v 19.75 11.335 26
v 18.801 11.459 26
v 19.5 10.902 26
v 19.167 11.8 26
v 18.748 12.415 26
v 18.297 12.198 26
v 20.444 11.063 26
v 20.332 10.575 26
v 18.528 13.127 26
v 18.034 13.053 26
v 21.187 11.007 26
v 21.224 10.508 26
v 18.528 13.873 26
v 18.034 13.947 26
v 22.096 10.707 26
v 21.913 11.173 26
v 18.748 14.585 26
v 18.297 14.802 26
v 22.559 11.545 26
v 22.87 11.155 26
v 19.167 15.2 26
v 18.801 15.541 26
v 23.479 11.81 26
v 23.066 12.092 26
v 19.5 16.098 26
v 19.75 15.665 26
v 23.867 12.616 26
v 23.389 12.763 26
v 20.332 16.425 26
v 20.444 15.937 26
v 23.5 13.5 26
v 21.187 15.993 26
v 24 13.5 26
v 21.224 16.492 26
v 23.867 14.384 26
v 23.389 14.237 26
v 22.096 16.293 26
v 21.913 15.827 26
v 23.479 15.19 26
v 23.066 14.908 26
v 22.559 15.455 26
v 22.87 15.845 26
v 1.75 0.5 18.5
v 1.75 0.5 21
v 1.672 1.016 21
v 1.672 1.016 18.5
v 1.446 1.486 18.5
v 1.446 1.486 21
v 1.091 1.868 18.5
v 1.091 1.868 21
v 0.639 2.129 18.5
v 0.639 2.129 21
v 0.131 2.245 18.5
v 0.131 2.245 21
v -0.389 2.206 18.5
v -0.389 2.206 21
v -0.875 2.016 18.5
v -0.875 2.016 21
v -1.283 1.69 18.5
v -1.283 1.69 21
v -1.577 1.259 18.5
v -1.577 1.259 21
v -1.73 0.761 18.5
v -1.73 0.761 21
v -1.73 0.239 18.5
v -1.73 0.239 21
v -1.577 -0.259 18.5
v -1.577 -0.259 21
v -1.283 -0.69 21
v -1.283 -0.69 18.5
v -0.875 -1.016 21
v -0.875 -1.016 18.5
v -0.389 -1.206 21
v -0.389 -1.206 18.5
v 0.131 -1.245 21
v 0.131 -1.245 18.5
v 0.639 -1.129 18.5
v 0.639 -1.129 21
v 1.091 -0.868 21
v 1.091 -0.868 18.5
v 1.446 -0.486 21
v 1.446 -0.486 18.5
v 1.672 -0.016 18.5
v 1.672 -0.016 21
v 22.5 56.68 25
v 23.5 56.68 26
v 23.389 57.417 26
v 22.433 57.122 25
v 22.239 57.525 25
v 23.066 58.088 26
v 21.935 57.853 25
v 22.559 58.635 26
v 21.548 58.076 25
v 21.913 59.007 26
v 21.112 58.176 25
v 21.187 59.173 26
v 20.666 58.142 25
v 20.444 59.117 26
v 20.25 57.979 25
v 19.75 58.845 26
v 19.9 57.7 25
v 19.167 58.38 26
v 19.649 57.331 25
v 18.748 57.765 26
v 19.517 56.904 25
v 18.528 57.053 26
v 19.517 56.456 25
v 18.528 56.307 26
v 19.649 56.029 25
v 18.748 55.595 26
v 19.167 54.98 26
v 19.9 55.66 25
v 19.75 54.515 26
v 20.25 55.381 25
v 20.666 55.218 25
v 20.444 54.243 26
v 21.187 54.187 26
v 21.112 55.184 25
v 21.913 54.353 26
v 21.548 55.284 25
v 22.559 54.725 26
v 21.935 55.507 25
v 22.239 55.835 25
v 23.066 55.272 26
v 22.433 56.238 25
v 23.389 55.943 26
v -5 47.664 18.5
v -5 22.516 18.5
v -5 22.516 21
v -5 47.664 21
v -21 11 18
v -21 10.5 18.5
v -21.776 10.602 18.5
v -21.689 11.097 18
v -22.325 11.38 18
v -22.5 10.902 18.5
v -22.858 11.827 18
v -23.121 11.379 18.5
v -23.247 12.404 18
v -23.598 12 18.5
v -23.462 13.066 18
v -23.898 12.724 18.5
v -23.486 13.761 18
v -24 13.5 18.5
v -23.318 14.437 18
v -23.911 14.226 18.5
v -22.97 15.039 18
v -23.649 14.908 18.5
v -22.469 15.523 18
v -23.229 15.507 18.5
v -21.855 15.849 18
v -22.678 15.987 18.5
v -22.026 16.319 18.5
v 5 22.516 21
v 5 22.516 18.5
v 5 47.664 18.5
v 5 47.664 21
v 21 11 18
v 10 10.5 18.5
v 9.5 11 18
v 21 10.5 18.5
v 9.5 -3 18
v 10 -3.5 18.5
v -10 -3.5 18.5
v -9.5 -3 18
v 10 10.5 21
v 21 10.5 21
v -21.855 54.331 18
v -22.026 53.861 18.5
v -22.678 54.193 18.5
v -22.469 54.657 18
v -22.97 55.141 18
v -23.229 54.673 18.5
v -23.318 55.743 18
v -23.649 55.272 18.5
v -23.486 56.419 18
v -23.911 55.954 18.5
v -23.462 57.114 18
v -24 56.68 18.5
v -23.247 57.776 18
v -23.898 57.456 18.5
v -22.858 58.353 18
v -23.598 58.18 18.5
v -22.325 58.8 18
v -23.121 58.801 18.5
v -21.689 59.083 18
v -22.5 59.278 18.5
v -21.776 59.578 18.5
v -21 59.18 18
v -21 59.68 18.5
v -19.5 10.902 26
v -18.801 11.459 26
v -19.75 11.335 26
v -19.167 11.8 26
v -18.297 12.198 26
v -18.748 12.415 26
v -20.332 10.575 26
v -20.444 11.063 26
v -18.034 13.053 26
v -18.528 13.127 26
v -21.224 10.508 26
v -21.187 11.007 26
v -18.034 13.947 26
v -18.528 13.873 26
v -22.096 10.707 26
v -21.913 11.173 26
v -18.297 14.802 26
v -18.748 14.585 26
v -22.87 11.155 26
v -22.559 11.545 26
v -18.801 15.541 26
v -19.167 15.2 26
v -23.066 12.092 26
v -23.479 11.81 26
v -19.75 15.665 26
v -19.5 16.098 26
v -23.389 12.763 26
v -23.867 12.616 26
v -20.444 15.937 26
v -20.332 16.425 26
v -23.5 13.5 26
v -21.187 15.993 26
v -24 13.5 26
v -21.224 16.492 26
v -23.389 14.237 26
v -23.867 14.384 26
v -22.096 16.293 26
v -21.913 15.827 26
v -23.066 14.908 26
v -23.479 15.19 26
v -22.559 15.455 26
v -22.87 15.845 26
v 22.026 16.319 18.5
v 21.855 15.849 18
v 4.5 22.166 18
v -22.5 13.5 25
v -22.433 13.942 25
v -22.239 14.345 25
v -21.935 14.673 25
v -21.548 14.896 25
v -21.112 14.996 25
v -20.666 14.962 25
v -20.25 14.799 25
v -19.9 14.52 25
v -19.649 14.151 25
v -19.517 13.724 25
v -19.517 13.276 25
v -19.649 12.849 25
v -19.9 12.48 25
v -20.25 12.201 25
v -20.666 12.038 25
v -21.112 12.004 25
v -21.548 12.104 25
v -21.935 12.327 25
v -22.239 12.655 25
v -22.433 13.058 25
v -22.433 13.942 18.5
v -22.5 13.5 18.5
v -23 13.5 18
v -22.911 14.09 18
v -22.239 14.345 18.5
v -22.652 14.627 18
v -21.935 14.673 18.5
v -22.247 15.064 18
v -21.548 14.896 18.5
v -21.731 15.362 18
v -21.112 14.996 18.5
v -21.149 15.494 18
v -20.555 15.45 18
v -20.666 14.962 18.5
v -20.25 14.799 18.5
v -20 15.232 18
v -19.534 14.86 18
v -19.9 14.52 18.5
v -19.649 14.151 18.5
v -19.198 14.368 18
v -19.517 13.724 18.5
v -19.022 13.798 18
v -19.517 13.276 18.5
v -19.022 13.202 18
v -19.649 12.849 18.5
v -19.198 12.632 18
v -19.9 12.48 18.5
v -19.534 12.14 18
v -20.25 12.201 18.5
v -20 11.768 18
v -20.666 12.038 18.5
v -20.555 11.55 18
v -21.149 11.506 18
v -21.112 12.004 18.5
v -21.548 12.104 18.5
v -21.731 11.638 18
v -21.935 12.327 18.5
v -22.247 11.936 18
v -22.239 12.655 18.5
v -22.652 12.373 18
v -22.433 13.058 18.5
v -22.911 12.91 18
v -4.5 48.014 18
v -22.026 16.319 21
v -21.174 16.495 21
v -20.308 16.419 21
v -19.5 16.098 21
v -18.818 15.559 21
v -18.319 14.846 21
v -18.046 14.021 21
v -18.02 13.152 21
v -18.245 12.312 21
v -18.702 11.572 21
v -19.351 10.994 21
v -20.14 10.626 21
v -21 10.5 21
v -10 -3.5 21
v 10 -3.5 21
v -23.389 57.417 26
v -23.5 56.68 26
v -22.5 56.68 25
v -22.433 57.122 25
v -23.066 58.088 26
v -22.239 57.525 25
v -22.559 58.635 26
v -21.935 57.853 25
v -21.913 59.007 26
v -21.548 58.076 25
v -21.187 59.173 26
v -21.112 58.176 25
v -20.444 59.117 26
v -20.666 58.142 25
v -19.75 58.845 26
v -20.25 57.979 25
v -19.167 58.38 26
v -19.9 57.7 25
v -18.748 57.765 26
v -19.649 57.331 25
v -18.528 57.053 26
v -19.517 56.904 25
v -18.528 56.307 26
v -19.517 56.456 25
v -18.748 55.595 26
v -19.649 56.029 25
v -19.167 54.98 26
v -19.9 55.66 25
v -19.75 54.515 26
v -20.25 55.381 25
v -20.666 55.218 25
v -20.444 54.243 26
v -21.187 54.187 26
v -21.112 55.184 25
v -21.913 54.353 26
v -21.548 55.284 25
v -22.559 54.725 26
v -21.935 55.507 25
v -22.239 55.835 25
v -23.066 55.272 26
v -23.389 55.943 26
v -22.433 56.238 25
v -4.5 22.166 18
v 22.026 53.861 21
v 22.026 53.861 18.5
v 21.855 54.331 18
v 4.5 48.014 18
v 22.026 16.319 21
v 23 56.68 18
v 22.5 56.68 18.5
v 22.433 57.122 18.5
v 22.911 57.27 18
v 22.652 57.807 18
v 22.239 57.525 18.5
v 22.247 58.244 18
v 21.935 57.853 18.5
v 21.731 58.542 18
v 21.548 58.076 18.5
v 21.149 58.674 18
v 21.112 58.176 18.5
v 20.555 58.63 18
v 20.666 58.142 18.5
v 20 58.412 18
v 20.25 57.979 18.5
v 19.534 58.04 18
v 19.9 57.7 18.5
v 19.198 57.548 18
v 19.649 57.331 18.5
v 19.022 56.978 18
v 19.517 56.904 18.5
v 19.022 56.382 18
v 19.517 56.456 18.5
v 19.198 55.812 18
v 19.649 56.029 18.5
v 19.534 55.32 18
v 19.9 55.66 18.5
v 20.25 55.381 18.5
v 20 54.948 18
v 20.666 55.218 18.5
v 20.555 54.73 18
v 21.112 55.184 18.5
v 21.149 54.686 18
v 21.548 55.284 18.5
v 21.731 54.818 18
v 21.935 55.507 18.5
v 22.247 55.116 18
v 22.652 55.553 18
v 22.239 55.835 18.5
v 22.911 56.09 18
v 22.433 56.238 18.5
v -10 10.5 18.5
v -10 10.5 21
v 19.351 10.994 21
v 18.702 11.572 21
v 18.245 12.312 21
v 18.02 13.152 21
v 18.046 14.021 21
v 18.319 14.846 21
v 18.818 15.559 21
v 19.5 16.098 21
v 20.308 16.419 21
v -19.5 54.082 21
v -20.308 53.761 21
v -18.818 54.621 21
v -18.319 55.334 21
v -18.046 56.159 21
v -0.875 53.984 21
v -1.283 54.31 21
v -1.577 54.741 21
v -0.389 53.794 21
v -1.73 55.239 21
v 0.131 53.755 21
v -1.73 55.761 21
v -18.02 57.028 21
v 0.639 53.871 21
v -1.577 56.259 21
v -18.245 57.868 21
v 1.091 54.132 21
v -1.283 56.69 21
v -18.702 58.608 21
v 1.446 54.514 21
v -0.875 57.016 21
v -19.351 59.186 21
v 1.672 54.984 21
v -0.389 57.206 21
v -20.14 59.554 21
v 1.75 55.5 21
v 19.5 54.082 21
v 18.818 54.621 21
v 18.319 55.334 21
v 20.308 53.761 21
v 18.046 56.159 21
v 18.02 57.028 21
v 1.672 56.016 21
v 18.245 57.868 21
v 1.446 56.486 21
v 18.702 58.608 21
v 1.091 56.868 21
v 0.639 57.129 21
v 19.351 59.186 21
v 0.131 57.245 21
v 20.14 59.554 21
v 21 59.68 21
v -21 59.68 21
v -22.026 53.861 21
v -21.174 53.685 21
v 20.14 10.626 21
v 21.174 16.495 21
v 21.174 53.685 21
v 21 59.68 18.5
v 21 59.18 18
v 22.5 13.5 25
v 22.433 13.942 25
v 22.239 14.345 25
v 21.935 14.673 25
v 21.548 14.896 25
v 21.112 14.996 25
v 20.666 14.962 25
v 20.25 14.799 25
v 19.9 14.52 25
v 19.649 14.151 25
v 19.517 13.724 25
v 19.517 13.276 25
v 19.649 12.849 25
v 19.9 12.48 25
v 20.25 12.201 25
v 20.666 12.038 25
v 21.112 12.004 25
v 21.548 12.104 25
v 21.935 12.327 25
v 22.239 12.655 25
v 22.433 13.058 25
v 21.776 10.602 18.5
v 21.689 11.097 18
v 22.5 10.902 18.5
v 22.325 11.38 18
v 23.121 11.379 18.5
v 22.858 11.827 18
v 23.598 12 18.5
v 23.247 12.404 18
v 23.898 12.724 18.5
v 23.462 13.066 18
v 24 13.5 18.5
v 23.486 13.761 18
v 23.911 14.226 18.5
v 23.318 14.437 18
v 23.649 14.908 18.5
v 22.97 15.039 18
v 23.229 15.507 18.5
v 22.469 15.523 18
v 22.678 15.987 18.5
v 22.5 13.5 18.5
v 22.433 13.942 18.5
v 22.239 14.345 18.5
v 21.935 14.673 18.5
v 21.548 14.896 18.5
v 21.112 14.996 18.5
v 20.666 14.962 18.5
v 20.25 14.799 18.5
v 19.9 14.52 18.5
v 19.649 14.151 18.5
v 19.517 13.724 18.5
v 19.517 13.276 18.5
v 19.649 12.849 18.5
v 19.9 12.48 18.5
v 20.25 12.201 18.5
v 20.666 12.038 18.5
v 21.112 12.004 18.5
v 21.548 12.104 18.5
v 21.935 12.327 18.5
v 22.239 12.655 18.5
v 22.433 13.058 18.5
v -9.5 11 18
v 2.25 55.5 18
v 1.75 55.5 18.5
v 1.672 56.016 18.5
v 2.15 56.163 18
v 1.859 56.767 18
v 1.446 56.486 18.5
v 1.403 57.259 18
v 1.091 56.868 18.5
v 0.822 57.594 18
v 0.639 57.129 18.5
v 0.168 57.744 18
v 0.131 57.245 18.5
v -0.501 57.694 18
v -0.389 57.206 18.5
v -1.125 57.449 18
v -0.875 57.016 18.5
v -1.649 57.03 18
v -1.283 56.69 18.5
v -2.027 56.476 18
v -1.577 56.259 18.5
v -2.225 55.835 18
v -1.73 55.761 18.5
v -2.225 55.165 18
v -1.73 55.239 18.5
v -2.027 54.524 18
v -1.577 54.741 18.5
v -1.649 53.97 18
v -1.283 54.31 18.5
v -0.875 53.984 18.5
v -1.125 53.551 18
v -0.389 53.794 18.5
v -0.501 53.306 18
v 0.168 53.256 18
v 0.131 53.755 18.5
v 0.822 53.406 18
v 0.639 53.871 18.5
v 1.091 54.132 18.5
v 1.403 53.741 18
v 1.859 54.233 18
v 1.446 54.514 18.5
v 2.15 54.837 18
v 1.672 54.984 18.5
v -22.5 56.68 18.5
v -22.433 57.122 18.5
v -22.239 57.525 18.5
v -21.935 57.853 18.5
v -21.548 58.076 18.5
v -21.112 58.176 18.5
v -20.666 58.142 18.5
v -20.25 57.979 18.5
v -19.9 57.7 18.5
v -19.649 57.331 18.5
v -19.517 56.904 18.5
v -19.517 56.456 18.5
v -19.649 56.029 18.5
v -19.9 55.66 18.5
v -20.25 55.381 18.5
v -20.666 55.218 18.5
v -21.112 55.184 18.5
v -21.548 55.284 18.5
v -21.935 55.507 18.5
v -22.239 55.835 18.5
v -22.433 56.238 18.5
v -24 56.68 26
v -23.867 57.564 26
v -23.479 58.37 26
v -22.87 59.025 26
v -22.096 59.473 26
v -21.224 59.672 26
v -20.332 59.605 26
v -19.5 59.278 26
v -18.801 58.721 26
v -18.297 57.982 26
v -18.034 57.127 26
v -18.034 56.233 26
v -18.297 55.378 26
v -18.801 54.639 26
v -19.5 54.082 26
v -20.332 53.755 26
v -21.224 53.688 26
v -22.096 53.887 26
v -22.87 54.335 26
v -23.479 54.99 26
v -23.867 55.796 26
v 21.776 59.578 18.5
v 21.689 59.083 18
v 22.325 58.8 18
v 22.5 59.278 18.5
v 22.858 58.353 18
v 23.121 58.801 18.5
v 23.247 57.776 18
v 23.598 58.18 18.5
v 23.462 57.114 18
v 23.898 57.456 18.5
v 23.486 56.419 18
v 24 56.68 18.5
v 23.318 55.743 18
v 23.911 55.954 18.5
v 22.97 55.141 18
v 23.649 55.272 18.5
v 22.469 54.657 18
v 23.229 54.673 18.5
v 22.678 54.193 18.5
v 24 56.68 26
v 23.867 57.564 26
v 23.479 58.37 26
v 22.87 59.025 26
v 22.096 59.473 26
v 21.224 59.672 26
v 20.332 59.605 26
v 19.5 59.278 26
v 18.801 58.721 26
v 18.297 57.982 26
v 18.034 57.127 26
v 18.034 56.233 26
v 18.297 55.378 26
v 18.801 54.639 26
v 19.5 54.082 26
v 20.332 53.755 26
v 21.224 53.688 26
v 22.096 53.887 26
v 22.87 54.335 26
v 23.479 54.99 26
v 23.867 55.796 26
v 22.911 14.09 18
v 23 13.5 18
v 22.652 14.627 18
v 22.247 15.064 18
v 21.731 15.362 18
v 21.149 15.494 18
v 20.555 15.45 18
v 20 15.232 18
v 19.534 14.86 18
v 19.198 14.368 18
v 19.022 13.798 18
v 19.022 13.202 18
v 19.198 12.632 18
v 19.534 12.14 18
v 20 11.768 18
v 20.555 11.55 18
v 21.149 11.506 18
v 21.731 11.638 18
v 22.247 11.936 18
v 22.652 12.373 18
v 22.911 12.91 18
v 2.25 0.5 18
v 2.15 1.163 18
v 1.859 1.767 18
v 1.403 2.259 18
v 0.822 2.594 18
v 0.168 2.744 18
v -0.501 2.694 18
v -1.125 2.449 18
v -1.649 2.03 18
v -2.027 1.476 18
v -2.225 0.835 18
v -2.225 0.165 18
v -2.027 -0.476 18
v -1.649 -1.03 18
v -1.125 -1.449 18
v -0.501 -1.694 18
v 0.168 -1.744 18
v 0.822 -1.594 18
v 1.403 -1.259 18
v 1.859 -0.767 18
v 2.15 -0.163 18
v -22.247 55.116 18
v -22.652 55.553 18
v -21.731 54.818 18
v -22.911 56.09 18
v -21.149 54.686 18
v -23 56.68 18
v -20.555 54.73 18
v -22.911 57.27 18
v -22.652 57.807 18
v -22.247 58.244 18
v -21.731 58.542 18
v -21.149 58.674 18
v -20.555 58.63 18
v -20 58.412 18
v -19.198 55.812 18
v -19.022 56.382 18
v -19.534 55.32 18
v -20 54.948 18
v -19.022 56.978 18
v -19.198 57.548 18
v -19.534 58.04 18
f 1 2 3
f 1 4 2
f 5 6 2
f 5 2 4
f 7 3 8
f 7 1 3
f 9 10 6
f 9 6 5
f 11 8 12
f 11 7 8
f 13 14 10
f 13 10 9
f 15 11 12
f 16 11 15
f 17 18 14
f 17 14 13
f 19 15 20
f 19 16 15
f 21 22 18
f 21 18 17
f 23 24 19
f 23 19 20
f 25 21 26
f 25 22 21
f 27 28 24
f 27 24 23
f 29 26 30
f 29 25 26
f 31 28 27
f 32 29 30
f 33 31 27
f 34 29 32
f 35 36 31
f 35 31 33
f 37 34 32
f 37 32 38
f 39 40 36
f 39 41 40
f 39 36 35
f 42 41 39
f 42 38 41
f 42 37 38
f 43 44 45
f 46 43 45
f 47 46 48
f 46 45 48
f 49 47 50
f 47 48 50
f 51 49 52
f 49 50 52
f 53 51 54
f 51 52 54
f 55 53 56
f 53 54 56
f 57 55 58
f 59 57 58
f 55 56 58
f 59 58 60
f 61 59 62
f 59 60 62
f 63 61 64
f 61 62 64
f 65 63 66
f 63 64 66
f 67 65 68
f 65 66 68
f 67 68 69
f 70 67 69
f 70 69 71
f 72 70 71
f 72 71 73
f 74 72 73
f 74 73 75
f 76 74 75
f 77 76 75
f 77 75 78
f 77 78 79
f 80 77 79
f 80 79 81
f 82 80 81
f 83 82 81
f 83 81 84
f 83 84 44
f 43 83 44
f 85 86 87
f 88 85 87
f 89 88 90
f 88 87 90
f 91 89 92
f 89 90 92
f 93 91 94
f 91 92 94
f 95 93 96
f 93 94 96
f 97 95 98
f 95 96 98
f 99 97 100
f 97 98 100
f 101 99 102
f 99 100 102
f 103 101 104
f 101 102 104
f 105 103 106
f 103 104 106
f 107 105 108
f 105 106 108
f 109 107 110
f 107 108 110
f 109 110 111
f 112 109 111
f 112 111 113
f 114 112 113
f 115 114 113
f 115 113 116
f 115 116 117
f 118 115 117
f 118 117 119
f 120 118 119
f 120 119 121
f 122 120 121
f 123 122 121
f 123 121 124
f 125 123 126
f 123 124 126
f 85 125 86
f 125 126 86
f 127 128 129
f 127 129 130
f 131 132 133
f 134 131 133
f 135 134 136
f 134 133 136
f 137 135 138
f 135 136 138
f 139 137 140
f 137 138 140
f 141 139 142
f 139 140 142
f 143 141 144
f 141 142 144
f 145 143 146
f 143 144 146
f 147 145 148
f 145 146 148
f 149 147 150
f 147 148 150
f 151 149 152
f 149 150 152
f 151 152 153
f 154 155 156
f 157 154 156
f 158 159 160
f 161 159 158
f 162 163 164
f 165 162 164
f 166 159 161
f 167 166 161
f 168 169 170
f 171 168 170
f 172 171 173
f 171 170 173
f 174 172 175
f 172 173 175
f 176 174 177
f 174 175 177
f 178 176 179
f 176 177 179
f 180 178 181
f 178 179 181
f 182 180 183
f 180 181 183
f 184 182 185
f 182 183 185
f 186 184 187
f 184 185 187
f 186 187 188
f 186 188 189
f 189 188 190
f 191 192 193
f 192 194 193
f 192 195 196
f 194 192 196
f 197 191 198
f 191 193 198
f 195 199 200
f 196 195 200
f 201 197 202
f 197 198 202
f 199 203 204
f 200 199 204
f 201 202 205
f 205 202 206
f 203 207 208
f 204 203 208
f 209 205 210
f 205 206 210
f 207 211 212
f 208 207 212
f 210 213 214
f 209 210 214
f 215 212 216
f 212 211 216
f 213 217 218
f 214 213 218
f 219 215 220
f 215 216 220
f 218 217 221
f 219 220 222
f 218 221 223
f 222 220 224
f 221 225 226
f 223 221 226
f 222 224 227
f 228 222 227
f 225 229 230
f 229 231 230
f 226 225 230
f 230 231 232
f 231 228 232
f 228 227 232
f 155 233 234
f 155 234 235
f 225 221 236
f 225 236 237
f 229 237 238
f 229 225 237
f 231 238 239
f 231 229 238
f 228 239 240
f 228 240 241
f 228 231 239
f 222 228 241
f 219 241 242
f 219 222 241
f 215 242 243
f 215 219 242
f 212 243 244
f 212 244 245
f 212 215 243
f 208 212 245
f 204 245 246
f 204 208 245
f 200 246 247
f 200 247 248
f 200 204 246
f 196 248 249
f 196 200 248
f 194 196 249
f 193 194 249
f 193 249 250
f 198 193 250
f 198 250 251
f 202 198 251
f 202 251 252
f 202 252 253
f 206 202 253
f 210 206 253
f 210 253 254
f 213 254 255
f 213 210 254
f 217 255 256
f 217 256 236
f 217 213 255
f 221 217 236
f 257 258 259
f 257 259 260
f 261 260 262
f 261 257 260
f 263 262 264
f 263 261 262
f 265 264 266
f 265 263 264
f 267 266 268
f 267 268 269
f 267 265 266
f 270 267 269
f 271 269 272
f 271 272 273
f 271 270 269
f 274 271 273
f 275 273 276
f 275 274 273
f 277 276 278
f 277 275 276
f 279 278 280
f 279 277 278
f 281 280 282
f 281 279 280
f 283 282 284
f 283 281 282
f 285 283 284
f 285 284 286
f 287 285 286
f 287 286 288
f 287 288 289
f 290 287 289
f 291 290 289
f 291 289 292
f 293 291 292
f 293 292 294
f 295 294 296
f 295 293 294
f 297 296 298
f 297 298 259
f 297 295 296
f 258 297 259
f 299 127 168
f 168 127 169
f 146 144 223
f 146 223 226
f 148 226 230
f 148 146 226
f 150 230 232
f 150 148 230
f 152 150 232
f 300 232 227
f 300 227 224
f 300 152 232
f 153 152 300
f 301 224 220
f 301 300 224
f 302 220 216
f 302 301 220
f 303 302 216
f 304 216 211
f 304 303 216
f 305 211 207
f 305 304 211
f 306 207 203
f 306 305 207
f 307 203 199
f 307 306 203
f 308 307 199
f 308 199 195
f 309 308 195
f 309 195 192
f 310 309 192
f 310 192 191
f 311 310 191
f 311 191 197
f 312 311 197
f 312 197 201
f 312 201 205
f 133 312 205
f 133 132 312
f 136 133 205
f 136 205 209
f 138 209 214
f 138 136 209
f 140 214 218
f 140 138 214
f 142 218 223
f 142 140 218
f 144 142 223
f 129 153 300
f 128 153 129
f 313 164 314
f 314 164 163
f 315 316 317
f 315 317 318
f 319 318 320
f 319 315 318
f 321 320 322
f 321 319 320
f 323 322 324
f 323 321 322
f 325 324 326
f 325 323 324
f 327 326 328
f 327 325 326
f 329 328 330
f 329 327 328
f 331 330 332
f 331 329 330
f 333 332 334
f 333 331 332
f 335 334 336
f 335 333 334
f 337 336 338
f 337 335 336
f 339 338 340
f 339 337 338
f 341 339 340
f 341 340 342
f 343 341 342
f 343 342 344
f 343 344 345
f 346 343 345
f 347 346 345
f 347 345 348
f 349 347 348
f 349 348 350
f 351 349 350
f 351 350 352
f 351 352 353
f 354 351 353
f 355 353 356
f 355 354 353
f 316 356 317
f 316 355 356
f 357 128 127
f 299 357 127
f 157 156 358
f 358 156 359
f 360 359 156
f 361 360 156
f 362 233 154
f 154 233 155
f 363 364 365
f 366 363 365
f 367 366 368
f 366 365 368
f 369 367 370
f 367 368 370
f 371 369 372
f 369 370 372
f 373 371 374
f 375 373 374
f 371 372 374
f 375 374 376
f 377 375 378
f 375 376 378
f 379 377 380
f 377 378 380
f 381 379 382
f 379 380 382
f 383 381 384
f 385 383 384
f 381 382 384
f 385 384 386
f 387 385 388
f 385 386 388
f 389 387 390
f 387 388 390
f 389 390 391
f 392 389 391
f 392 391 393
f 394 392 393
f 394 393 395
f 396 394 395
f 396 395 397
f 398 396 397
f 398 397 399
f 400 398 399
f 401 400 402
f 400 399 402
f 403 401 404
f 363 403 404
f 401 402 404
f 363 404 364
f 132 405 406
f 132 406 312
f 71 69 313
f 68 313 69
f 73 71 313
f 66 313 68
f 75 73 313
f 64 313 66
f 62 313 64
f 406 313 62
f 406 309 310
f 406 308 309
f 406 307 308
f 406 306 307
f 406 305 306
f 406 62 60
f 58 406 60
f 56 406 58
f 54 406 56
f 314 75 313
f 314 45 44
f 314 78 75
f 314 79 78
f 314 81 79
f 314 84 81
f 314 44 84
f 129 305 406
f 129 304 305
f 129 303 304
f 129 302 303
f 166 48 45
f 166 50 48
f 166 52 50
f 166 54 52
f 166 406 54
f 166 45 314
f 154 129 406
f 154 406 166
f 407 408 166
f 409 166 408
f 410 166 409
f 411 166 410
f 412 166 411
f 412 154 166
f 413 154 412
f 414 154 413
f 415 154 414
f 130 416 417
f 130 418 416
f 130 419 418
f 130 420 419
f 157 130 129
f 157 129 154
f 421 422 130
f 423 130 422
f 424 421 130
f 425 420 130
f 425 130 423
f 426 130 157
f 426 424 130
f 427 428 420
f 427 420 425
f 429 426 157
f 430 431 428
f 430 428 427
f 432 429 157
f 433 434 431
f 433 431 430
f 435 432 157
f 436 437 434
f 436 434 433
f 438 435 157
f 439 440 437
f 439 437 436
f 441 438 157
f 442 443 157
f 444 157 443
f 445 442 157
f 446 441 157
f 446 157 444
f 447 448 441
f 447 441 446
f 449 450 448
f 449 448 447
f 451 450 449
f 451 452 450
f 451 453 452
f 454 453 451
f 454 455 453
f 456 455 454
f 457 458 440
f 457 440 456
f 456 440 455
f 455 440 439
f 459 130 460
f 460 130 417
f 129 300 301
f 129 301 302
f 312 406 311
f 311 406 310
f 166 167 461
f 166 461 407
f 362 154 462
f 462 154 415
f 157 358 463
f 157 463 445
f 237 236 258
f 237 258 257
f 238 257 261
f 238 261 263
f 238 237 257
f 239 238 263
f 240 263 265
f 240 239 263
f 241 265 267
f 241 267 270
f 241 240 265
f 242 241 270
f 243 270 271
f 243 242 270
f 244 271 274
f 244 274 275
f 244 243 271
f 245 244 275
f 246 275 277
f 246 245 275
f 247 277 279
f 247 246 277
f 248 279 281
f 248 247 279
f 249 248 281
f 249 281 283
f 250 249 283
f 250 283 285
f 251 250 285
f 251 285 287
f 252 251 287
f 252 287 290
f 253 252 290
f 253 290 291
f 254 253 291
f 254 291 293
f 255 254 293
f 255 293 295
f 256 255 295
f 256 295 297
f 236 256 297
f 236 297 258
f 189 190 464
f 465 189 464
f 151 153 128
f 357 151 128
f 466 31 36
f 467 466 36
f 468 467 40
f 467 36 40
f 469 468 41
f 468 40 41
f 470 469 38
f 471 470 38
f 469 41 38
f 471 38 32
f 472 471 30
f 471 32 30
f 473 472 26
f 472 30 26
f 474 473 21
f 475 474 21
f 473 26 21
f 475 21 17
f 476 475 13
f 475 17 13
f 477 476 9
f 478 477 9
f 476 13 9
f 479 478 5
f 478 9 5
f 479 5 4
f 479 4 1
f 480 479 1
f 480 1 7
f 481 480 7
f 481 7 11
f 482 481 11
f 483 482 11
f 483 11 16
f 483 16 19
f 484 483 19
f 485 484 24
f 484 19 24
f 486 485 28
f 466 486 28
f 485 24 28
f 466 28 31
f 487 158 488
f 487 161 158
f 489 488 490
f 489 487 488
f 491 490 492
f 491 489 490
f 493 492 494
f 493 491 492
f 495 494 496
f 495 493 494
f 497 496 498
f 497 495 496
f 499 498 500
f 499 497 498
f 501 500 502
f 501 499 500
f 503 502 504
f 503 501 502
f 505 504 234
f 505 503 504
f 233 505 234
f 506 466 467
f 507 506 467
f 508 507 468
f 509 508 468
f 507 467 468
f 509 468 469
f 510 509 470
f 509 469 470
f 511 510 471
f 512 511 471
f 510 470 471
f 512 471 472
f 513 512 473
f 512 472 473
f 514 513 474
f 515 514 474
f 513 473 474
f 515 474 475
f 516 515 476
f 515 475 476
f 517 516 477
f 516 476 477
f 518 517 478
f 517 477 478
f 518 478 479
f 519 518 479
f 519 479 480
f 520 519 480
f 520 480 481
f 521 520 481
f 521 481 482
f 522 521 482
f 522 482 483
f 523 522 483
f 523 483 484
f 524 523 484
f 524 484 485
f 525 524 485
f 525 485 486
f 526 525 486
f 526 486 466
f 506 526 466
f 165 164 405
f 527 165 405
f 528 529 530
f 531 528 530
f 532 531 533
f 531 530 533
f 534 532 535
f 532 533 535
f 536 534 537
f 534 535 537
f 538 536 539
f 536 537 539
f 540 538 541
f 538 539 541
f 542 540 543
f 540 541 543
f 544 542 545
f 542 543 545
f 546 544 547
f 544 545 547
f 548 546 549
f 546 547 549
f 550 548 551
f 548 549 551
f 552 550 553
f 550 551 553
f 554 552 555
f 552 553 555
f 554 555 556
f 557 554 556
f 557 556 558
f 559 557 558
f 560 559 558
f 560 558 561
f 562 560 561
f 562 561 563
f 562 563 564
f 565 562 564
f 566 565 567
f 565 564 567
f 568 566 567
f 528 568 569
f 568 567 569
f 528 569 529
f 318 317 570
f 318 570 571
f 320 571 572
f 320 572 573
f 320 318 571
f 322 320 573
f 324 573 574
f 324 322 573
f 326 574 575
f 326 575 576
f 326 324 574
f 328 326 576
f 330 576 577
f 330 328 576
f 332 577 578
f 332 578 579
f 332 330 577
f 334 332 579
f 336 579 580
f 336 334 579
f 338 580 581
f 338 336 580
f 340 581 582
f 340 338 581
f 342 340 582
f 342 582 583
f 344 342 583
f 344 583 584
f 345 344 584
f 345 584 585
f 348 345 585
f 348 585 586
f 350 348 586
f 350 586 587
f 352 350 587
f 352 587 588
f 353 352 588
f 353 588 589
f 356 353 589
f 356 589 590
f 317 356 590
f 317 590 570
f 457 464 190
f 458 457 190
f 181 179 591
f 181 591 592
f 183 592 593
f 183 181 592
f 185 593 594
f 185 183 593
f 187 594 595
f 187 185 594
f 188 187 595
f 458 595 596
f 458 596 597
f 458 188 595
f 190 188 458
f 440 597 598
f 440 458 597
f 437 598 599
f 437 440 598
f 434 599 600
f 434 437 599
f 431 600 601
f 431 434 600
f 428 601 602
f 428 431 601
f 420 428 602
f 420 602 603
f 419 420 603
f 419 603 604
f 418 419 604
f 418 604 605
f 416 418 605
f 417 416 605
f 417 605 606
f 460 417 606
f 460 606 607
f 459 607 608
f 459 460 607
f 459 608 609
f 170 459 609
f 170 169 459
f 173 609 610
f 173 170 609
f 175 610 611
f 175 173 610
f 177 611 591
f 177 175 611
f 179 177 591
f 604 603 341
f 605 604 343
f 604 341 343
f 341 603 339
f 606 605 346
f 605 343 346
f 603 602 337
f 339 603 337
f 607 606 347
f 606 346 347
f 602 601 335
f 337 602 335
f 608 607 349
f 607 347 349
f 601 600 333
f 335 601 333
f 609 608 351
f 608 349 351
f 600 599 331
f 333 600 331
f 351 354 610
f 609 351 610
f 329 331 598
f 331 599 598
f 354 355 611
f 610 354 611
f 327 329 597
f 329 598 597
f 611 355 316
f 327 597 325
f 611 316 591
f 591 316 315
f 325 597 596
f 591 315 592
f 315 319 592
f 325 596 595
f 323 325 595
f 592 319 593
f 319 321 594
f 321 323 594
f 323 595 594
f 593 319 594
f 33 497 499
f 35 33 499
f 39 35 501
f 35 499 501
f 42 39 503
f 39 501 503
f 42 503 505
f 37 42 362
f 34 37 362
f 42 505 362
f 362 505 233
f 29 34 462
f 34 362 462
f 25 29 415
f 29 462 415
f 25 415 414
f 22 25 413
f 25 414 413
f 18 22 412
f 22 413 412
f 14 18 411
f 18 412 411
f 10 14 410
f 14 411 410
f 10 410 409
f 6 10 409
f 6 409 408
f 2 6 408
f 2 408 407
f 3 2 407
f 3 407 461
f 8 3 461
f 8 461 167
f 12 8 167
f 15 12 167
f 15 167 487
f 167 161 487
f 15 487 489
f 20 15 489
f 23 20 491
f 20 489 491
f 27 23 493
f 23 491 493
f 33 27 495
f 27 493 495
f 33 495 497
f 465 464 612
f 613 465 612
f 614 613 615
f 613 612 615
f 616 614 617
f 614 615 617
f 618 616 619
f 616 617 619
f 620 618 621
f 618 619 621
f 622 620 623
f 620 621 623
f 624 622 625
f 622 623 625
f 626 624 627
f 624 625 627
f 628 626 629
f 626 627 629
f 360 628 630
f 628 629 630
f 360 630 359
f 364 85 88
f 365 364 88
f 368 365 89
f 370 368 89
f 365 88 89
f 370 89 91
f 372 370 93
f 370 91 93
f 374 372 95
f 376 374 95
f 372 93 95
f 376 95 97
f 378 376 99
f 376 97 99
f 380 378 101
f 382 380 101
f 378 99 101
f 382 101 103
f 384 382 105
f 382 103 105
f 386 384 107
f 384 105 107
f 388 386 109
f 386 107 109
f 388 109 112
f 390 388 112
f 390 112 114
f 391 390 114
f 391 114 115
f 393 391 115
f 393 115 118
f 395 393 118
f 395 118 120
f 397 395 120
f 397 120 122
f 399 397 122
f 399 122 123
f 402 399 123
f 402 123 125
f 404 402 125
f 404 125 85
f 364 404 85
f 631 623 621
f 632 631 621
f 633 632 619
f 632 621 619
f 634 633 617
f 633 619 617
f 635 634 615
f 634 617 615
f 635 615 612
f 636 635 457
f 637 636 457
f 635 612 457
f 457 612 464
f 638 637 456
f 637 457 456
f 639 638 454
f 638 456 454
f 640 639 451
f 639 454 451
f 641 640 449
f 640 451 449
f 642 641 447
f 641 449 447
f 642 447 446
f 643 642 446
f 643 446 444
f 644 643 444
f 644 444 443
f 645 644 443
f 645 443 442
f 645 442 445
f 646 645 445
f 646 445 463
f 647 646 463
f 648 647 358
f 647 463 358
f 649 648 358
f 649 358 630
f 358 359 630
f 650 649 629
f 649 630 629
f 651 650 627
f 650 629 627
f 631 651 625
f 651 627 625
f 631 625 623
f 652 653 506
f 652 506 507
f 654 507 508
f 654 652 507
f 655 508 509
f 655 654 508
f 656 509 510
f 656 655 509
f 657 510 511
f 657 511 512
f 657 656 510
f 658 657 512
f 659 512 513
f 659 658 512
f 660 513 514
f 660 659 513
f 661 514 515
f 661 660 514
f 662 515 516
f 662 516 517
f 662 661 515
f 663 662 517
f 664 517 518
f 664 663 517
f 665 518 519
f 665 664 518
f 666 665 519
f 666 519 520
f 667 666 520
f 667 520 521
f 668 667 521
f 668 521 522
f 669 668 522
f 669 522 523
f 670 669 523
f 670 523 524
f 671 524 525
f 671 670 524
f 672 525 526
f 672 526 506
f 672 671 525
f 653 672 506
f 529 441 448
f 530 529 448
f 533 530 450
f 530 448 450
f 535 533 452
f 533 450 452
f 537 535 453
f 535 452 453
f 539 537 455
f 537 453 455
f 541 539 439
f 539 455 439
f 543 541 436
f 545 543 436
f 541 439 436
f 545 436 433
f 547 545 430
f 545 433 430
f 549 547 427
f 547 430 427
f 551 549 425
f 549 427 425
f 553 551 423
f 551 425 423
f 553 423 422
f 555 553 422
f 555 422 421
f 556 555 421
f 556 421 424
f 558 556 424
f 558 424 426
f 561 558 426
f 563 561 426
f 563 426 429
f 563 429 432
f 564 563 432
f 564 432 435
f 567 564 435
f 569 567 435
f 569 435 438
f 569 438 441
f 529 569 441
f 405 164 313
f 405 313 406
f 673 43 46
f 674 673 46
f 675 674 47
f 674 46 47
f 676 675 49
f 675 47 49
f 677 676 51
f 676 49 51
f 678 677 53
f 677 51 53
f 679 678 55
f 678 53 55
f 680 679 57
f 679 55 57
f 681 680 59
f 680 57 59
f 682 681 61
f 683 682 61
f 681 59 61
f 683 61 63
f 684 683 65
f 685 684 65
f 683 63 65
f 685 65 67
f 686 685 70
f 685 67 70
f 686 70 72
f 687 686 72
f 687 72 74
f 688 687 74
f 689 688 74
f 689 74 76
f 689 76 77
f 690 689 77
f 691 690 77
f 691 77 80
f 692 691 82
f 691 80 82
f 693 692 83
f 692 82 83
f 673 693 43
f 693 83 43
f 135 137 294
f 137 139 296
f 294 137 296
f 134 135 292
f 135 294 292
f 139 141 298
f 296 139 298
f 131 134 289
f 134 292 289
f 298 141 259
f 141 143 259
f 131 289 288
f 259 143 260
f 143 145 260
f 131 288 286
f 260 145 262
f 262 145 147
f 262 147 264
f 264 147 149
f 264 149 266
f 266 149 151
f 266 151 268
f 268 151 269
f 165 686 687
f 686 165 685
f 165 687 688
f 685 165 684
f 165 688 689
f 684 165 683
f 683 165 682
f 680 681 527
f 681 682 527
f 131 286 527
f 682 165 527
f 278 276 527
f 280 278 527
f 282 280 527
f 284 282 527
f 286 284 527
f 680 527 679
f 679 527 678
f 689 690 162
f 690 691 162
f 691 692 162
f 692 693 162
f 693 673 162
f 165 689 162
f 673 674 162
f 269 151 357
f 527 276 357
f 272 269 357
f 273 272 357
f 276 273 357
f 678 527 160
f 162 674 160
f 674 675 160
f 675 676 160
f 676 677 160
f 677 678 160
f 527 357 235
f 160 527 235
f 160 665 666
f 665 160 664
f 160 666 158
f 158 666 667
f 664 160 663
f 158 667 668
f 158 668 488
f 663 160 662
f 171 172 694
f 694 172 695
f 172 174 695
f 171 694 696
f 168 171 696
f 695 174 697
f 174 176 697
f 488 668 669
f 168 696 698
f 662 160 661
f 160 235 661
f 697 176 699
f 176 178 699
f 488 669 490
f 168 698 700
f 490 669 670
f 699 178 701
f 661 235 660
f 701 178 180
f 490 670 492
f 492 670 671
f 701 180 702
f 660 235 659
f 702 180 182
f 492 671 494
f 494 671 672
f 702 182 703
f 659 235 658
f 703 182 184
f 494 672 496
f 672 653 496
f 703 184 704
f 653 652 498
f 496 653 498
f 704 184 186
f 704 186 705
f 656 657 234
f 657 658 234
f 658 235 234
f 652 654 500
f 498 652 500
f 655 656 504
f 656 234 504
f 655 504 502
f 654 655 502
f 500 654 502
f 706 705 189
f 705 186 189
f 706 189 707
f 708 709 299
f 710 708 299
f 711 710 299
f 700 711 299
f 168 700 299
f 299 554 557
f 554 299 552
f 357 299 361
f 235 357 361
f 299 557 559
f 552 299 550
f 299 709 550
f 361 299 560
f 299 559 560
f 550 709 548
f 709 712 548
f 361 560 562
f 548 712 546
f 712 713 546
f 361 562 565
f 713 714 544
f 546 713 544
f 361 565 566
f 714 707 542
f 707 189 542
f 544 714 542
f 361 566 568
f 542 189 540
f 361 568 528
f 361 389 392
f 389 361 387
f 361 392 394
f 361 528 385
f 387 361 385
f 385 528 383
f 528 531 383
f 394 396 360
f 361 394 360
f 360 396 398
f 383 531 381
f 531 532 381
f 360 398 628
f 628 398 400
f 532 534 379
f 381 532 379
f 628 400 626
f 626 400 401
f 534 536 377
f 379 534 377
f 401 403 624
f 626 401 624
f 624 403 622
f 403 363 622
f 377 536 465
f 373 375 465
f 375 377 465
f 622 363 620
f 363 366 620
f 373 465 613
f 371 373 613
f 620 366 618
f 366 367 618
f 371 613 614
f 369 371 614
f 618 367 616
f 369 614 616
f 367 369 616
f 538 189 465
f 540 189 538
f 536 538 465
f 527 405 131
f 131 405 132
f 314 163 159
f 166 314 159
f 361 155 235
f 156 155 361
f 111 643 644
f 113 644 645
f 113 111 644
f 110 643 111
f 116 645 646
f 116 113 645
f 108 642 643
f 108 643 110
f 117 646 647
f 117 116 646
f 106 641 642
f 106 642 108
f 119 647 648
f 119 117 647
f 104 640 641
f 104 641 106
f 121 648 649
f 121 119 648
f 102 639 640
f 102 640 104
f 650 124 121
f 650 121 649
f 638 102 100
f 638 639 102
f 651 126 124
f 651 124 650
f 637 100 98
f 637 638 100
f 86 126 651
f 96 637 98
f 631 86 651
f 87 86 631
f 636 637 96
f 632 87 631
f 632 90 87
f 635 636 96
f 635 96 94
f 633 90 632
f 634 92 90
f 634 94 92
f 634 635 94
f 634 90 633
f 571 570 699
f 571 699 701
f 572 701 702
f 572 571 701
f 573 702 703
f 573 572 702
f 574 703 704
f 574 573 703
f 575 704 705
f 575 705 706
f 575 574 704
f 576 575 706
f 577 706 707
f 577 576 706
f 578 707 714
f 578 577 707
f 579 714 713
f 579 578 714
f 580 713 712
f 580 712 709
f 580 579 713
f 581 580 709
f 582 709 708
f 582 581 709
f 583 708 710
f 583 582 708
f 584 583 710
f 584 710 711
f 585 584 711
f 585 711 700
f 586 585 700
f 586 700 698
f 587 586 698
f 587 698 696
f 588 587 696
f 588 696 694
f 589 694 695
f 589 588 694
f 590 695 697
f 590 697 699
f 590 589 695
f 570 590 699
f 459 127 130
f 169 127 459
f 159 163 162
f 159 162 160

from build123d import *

# Parameters (mm, degrees)
CYLINDER005_R     = 3
CYLINDER005_DEPTH = 8
PAD011_DEPTH      = 3
CYLINDER006_R     = 3
CYLINDER006_DEPTH = 8
SKETCH039_R       = 1.5
POCKET027_DEPTH   = 10
CHAMFER026_SIZE   = 1
SKETCH038_R       = 1.75
POCKET026_DEPTH   = 5
CHAMFER025_SIZE   = 0.5


with BuildPart() as keypadbracketscrewcylinder002:
    # Cylinder005 → Cylinder005 (new body)
    with BuildSketch(Plane(origin=(21, 13.5, 18), x_dir=(1, 0, 0), z_dir=(0, 0, 1))):
        Circle(CYLINDER005_R)
    extrude(amount=CYLINDER005_DEPTH)


with BuildPart() as keypadbracketpad008:
    # Sketch037 → Pad011 (new body)
    with BuildSketch(Plane.XY.offset(18)):
        with BuildLine():
            Line((0, -3.5), (10, -3.5))
            Line((10, -3.5), (10, 10.5))
            Line((10, 10.5), (21, 10.5))
            ThreePointArc((21, 10.5), (23.954423, 12.979055), (22.02606, 16.319078))
            Line((22.02606, 16.319078), (5, 22.516057))
            Line((5, 22.516057), (5, 47.663943))
            Line((5, 47.663943), (22.02606, 53.860922))
            ThreePointArc((22.02606, 53.860922), (23.954423, 57.200945), (21, 59.68))
            Line((21, 59.68), (0, 59.68))
            Line((0, 59.68), (0, -3.5))
        make_face()
    extrude(amount=PAD011_DEPTH)


with BuildPart() as keypadbracketscrewholeschamfer019:
    # Cylinder006 → Cylinder006 (new body)
    with BuildSketch(Plane(origin=(21, 56.68, 18), x_dir=(1, 0, 0), z_dir=(0, 0, 1))):
        Circle(CYLINDER006_R)
    extrude(amount=CYLINDER006_DEPTH)

    # Fusion005: union KeypadBracketScrewCylinder002, KeypadBracketPad008
    add(keypadbracketscrewcylinder002.part)
    add(keypadbracketpad008.part)

    # Sketch039 → Pocket027 (cut)
    with BuildSketch(Plane.XY.offset(26)):
        with Locations((21, 13.5)):
            Circle(SKETCH039_R)
        with Locations((21, 56.68)):
            Circle(SKETCH039_R)
    extrude(amount=-POCKET027_DEPTH, mode=Mode.SUBTRACT)

    # Chamfer026
    chamfer026_edges = [keypadbracketscrewholeschamfer019.edges().sort_by_distance(p)[0] for p in [
        (19.5, 56.68, 26),
        (19.5, 13.5, 26),
    ]]
    chamfer(chamfer026_edges, length=CHAMFER026_SIZE)


with BuildPart() as keypadbracketprintingchamfer019_final001:
    # Part__Mirroring005: instance of KeypadBracketScrewHolesChamfer019
    add(keypadbracketscrewholeschamfer019.part.mirror(Plane(origin=(0, 0, 0), x_dir=(0, -1, 0), z_dir=(1, 0, 0))))

    # Fusion006: union KeypadBracketScrewHolesChamfer019
    add(keypadbracketscrewholeschamfer019.part)

    # Sketch038 → Pocket026 (cut)
    with BuildSketch(Plane.XY.offset(21)):
        with Locations((0, 0.5)):
            Circle(SKETCH038_R)
        with Locations((0, 55.5)):
            Circle(SKETCH038_R)
    extrude(amount=-POCKET026_DEPTH, mode=Mode.SUBTRACT)

    # Chamfer025
    chamfer025_edges = [keypadbracketprintingchamfer019_final001.edges().sort_by_distance(p)[0] for p in [
        (-21, 15, 18),
        (-21, 12, 18),
        (0, 57.25, 18),
        (0, 53.75, 18),
        (0, 2.25, 18),
        (0, -1.25, 18),
        (-23.12132, 58.80132, 18),
        (-23.457456, 54.959271, 18),
        (0, 59.68, 18),
        (-13.51303, 50.762433, 18),
        (23.12132, 58.80132, 18),
        (-5, 35.09, 18),
        (23.457456, 54.959271, 18),
        (-13.51303, 19.417567, 18),
        (13.51303, 50.762433, 18),
        (-23.457456, 15.220729, 18),
        (5, 35.09, 18),
        (-23.12132, 11.37868, 18),
        (13.51303, 19.417567, 18),
        (-15.5, 10.5, 18),
        (23.457456, 15.220729, 18),
        (-10, 3.5, 18),
        (23.12132, 11.37868, 18),
        (0, -3.5, 18),
        (15.5, 10.5, 18),
        (10, 3.5, 18),
        (-21, 58.18, 18),
        (-21, 55.18, 18),
        (21, 58.18, 18),
        (21, 55.18, 18),
        (21, 15, 18),
        (21, 12, 18),
    ]]
    chamfer(chamfer025_edges, length=CHAMFER025_SIZE)


solid = keypadbracketprintingchamfer019_final001.part
